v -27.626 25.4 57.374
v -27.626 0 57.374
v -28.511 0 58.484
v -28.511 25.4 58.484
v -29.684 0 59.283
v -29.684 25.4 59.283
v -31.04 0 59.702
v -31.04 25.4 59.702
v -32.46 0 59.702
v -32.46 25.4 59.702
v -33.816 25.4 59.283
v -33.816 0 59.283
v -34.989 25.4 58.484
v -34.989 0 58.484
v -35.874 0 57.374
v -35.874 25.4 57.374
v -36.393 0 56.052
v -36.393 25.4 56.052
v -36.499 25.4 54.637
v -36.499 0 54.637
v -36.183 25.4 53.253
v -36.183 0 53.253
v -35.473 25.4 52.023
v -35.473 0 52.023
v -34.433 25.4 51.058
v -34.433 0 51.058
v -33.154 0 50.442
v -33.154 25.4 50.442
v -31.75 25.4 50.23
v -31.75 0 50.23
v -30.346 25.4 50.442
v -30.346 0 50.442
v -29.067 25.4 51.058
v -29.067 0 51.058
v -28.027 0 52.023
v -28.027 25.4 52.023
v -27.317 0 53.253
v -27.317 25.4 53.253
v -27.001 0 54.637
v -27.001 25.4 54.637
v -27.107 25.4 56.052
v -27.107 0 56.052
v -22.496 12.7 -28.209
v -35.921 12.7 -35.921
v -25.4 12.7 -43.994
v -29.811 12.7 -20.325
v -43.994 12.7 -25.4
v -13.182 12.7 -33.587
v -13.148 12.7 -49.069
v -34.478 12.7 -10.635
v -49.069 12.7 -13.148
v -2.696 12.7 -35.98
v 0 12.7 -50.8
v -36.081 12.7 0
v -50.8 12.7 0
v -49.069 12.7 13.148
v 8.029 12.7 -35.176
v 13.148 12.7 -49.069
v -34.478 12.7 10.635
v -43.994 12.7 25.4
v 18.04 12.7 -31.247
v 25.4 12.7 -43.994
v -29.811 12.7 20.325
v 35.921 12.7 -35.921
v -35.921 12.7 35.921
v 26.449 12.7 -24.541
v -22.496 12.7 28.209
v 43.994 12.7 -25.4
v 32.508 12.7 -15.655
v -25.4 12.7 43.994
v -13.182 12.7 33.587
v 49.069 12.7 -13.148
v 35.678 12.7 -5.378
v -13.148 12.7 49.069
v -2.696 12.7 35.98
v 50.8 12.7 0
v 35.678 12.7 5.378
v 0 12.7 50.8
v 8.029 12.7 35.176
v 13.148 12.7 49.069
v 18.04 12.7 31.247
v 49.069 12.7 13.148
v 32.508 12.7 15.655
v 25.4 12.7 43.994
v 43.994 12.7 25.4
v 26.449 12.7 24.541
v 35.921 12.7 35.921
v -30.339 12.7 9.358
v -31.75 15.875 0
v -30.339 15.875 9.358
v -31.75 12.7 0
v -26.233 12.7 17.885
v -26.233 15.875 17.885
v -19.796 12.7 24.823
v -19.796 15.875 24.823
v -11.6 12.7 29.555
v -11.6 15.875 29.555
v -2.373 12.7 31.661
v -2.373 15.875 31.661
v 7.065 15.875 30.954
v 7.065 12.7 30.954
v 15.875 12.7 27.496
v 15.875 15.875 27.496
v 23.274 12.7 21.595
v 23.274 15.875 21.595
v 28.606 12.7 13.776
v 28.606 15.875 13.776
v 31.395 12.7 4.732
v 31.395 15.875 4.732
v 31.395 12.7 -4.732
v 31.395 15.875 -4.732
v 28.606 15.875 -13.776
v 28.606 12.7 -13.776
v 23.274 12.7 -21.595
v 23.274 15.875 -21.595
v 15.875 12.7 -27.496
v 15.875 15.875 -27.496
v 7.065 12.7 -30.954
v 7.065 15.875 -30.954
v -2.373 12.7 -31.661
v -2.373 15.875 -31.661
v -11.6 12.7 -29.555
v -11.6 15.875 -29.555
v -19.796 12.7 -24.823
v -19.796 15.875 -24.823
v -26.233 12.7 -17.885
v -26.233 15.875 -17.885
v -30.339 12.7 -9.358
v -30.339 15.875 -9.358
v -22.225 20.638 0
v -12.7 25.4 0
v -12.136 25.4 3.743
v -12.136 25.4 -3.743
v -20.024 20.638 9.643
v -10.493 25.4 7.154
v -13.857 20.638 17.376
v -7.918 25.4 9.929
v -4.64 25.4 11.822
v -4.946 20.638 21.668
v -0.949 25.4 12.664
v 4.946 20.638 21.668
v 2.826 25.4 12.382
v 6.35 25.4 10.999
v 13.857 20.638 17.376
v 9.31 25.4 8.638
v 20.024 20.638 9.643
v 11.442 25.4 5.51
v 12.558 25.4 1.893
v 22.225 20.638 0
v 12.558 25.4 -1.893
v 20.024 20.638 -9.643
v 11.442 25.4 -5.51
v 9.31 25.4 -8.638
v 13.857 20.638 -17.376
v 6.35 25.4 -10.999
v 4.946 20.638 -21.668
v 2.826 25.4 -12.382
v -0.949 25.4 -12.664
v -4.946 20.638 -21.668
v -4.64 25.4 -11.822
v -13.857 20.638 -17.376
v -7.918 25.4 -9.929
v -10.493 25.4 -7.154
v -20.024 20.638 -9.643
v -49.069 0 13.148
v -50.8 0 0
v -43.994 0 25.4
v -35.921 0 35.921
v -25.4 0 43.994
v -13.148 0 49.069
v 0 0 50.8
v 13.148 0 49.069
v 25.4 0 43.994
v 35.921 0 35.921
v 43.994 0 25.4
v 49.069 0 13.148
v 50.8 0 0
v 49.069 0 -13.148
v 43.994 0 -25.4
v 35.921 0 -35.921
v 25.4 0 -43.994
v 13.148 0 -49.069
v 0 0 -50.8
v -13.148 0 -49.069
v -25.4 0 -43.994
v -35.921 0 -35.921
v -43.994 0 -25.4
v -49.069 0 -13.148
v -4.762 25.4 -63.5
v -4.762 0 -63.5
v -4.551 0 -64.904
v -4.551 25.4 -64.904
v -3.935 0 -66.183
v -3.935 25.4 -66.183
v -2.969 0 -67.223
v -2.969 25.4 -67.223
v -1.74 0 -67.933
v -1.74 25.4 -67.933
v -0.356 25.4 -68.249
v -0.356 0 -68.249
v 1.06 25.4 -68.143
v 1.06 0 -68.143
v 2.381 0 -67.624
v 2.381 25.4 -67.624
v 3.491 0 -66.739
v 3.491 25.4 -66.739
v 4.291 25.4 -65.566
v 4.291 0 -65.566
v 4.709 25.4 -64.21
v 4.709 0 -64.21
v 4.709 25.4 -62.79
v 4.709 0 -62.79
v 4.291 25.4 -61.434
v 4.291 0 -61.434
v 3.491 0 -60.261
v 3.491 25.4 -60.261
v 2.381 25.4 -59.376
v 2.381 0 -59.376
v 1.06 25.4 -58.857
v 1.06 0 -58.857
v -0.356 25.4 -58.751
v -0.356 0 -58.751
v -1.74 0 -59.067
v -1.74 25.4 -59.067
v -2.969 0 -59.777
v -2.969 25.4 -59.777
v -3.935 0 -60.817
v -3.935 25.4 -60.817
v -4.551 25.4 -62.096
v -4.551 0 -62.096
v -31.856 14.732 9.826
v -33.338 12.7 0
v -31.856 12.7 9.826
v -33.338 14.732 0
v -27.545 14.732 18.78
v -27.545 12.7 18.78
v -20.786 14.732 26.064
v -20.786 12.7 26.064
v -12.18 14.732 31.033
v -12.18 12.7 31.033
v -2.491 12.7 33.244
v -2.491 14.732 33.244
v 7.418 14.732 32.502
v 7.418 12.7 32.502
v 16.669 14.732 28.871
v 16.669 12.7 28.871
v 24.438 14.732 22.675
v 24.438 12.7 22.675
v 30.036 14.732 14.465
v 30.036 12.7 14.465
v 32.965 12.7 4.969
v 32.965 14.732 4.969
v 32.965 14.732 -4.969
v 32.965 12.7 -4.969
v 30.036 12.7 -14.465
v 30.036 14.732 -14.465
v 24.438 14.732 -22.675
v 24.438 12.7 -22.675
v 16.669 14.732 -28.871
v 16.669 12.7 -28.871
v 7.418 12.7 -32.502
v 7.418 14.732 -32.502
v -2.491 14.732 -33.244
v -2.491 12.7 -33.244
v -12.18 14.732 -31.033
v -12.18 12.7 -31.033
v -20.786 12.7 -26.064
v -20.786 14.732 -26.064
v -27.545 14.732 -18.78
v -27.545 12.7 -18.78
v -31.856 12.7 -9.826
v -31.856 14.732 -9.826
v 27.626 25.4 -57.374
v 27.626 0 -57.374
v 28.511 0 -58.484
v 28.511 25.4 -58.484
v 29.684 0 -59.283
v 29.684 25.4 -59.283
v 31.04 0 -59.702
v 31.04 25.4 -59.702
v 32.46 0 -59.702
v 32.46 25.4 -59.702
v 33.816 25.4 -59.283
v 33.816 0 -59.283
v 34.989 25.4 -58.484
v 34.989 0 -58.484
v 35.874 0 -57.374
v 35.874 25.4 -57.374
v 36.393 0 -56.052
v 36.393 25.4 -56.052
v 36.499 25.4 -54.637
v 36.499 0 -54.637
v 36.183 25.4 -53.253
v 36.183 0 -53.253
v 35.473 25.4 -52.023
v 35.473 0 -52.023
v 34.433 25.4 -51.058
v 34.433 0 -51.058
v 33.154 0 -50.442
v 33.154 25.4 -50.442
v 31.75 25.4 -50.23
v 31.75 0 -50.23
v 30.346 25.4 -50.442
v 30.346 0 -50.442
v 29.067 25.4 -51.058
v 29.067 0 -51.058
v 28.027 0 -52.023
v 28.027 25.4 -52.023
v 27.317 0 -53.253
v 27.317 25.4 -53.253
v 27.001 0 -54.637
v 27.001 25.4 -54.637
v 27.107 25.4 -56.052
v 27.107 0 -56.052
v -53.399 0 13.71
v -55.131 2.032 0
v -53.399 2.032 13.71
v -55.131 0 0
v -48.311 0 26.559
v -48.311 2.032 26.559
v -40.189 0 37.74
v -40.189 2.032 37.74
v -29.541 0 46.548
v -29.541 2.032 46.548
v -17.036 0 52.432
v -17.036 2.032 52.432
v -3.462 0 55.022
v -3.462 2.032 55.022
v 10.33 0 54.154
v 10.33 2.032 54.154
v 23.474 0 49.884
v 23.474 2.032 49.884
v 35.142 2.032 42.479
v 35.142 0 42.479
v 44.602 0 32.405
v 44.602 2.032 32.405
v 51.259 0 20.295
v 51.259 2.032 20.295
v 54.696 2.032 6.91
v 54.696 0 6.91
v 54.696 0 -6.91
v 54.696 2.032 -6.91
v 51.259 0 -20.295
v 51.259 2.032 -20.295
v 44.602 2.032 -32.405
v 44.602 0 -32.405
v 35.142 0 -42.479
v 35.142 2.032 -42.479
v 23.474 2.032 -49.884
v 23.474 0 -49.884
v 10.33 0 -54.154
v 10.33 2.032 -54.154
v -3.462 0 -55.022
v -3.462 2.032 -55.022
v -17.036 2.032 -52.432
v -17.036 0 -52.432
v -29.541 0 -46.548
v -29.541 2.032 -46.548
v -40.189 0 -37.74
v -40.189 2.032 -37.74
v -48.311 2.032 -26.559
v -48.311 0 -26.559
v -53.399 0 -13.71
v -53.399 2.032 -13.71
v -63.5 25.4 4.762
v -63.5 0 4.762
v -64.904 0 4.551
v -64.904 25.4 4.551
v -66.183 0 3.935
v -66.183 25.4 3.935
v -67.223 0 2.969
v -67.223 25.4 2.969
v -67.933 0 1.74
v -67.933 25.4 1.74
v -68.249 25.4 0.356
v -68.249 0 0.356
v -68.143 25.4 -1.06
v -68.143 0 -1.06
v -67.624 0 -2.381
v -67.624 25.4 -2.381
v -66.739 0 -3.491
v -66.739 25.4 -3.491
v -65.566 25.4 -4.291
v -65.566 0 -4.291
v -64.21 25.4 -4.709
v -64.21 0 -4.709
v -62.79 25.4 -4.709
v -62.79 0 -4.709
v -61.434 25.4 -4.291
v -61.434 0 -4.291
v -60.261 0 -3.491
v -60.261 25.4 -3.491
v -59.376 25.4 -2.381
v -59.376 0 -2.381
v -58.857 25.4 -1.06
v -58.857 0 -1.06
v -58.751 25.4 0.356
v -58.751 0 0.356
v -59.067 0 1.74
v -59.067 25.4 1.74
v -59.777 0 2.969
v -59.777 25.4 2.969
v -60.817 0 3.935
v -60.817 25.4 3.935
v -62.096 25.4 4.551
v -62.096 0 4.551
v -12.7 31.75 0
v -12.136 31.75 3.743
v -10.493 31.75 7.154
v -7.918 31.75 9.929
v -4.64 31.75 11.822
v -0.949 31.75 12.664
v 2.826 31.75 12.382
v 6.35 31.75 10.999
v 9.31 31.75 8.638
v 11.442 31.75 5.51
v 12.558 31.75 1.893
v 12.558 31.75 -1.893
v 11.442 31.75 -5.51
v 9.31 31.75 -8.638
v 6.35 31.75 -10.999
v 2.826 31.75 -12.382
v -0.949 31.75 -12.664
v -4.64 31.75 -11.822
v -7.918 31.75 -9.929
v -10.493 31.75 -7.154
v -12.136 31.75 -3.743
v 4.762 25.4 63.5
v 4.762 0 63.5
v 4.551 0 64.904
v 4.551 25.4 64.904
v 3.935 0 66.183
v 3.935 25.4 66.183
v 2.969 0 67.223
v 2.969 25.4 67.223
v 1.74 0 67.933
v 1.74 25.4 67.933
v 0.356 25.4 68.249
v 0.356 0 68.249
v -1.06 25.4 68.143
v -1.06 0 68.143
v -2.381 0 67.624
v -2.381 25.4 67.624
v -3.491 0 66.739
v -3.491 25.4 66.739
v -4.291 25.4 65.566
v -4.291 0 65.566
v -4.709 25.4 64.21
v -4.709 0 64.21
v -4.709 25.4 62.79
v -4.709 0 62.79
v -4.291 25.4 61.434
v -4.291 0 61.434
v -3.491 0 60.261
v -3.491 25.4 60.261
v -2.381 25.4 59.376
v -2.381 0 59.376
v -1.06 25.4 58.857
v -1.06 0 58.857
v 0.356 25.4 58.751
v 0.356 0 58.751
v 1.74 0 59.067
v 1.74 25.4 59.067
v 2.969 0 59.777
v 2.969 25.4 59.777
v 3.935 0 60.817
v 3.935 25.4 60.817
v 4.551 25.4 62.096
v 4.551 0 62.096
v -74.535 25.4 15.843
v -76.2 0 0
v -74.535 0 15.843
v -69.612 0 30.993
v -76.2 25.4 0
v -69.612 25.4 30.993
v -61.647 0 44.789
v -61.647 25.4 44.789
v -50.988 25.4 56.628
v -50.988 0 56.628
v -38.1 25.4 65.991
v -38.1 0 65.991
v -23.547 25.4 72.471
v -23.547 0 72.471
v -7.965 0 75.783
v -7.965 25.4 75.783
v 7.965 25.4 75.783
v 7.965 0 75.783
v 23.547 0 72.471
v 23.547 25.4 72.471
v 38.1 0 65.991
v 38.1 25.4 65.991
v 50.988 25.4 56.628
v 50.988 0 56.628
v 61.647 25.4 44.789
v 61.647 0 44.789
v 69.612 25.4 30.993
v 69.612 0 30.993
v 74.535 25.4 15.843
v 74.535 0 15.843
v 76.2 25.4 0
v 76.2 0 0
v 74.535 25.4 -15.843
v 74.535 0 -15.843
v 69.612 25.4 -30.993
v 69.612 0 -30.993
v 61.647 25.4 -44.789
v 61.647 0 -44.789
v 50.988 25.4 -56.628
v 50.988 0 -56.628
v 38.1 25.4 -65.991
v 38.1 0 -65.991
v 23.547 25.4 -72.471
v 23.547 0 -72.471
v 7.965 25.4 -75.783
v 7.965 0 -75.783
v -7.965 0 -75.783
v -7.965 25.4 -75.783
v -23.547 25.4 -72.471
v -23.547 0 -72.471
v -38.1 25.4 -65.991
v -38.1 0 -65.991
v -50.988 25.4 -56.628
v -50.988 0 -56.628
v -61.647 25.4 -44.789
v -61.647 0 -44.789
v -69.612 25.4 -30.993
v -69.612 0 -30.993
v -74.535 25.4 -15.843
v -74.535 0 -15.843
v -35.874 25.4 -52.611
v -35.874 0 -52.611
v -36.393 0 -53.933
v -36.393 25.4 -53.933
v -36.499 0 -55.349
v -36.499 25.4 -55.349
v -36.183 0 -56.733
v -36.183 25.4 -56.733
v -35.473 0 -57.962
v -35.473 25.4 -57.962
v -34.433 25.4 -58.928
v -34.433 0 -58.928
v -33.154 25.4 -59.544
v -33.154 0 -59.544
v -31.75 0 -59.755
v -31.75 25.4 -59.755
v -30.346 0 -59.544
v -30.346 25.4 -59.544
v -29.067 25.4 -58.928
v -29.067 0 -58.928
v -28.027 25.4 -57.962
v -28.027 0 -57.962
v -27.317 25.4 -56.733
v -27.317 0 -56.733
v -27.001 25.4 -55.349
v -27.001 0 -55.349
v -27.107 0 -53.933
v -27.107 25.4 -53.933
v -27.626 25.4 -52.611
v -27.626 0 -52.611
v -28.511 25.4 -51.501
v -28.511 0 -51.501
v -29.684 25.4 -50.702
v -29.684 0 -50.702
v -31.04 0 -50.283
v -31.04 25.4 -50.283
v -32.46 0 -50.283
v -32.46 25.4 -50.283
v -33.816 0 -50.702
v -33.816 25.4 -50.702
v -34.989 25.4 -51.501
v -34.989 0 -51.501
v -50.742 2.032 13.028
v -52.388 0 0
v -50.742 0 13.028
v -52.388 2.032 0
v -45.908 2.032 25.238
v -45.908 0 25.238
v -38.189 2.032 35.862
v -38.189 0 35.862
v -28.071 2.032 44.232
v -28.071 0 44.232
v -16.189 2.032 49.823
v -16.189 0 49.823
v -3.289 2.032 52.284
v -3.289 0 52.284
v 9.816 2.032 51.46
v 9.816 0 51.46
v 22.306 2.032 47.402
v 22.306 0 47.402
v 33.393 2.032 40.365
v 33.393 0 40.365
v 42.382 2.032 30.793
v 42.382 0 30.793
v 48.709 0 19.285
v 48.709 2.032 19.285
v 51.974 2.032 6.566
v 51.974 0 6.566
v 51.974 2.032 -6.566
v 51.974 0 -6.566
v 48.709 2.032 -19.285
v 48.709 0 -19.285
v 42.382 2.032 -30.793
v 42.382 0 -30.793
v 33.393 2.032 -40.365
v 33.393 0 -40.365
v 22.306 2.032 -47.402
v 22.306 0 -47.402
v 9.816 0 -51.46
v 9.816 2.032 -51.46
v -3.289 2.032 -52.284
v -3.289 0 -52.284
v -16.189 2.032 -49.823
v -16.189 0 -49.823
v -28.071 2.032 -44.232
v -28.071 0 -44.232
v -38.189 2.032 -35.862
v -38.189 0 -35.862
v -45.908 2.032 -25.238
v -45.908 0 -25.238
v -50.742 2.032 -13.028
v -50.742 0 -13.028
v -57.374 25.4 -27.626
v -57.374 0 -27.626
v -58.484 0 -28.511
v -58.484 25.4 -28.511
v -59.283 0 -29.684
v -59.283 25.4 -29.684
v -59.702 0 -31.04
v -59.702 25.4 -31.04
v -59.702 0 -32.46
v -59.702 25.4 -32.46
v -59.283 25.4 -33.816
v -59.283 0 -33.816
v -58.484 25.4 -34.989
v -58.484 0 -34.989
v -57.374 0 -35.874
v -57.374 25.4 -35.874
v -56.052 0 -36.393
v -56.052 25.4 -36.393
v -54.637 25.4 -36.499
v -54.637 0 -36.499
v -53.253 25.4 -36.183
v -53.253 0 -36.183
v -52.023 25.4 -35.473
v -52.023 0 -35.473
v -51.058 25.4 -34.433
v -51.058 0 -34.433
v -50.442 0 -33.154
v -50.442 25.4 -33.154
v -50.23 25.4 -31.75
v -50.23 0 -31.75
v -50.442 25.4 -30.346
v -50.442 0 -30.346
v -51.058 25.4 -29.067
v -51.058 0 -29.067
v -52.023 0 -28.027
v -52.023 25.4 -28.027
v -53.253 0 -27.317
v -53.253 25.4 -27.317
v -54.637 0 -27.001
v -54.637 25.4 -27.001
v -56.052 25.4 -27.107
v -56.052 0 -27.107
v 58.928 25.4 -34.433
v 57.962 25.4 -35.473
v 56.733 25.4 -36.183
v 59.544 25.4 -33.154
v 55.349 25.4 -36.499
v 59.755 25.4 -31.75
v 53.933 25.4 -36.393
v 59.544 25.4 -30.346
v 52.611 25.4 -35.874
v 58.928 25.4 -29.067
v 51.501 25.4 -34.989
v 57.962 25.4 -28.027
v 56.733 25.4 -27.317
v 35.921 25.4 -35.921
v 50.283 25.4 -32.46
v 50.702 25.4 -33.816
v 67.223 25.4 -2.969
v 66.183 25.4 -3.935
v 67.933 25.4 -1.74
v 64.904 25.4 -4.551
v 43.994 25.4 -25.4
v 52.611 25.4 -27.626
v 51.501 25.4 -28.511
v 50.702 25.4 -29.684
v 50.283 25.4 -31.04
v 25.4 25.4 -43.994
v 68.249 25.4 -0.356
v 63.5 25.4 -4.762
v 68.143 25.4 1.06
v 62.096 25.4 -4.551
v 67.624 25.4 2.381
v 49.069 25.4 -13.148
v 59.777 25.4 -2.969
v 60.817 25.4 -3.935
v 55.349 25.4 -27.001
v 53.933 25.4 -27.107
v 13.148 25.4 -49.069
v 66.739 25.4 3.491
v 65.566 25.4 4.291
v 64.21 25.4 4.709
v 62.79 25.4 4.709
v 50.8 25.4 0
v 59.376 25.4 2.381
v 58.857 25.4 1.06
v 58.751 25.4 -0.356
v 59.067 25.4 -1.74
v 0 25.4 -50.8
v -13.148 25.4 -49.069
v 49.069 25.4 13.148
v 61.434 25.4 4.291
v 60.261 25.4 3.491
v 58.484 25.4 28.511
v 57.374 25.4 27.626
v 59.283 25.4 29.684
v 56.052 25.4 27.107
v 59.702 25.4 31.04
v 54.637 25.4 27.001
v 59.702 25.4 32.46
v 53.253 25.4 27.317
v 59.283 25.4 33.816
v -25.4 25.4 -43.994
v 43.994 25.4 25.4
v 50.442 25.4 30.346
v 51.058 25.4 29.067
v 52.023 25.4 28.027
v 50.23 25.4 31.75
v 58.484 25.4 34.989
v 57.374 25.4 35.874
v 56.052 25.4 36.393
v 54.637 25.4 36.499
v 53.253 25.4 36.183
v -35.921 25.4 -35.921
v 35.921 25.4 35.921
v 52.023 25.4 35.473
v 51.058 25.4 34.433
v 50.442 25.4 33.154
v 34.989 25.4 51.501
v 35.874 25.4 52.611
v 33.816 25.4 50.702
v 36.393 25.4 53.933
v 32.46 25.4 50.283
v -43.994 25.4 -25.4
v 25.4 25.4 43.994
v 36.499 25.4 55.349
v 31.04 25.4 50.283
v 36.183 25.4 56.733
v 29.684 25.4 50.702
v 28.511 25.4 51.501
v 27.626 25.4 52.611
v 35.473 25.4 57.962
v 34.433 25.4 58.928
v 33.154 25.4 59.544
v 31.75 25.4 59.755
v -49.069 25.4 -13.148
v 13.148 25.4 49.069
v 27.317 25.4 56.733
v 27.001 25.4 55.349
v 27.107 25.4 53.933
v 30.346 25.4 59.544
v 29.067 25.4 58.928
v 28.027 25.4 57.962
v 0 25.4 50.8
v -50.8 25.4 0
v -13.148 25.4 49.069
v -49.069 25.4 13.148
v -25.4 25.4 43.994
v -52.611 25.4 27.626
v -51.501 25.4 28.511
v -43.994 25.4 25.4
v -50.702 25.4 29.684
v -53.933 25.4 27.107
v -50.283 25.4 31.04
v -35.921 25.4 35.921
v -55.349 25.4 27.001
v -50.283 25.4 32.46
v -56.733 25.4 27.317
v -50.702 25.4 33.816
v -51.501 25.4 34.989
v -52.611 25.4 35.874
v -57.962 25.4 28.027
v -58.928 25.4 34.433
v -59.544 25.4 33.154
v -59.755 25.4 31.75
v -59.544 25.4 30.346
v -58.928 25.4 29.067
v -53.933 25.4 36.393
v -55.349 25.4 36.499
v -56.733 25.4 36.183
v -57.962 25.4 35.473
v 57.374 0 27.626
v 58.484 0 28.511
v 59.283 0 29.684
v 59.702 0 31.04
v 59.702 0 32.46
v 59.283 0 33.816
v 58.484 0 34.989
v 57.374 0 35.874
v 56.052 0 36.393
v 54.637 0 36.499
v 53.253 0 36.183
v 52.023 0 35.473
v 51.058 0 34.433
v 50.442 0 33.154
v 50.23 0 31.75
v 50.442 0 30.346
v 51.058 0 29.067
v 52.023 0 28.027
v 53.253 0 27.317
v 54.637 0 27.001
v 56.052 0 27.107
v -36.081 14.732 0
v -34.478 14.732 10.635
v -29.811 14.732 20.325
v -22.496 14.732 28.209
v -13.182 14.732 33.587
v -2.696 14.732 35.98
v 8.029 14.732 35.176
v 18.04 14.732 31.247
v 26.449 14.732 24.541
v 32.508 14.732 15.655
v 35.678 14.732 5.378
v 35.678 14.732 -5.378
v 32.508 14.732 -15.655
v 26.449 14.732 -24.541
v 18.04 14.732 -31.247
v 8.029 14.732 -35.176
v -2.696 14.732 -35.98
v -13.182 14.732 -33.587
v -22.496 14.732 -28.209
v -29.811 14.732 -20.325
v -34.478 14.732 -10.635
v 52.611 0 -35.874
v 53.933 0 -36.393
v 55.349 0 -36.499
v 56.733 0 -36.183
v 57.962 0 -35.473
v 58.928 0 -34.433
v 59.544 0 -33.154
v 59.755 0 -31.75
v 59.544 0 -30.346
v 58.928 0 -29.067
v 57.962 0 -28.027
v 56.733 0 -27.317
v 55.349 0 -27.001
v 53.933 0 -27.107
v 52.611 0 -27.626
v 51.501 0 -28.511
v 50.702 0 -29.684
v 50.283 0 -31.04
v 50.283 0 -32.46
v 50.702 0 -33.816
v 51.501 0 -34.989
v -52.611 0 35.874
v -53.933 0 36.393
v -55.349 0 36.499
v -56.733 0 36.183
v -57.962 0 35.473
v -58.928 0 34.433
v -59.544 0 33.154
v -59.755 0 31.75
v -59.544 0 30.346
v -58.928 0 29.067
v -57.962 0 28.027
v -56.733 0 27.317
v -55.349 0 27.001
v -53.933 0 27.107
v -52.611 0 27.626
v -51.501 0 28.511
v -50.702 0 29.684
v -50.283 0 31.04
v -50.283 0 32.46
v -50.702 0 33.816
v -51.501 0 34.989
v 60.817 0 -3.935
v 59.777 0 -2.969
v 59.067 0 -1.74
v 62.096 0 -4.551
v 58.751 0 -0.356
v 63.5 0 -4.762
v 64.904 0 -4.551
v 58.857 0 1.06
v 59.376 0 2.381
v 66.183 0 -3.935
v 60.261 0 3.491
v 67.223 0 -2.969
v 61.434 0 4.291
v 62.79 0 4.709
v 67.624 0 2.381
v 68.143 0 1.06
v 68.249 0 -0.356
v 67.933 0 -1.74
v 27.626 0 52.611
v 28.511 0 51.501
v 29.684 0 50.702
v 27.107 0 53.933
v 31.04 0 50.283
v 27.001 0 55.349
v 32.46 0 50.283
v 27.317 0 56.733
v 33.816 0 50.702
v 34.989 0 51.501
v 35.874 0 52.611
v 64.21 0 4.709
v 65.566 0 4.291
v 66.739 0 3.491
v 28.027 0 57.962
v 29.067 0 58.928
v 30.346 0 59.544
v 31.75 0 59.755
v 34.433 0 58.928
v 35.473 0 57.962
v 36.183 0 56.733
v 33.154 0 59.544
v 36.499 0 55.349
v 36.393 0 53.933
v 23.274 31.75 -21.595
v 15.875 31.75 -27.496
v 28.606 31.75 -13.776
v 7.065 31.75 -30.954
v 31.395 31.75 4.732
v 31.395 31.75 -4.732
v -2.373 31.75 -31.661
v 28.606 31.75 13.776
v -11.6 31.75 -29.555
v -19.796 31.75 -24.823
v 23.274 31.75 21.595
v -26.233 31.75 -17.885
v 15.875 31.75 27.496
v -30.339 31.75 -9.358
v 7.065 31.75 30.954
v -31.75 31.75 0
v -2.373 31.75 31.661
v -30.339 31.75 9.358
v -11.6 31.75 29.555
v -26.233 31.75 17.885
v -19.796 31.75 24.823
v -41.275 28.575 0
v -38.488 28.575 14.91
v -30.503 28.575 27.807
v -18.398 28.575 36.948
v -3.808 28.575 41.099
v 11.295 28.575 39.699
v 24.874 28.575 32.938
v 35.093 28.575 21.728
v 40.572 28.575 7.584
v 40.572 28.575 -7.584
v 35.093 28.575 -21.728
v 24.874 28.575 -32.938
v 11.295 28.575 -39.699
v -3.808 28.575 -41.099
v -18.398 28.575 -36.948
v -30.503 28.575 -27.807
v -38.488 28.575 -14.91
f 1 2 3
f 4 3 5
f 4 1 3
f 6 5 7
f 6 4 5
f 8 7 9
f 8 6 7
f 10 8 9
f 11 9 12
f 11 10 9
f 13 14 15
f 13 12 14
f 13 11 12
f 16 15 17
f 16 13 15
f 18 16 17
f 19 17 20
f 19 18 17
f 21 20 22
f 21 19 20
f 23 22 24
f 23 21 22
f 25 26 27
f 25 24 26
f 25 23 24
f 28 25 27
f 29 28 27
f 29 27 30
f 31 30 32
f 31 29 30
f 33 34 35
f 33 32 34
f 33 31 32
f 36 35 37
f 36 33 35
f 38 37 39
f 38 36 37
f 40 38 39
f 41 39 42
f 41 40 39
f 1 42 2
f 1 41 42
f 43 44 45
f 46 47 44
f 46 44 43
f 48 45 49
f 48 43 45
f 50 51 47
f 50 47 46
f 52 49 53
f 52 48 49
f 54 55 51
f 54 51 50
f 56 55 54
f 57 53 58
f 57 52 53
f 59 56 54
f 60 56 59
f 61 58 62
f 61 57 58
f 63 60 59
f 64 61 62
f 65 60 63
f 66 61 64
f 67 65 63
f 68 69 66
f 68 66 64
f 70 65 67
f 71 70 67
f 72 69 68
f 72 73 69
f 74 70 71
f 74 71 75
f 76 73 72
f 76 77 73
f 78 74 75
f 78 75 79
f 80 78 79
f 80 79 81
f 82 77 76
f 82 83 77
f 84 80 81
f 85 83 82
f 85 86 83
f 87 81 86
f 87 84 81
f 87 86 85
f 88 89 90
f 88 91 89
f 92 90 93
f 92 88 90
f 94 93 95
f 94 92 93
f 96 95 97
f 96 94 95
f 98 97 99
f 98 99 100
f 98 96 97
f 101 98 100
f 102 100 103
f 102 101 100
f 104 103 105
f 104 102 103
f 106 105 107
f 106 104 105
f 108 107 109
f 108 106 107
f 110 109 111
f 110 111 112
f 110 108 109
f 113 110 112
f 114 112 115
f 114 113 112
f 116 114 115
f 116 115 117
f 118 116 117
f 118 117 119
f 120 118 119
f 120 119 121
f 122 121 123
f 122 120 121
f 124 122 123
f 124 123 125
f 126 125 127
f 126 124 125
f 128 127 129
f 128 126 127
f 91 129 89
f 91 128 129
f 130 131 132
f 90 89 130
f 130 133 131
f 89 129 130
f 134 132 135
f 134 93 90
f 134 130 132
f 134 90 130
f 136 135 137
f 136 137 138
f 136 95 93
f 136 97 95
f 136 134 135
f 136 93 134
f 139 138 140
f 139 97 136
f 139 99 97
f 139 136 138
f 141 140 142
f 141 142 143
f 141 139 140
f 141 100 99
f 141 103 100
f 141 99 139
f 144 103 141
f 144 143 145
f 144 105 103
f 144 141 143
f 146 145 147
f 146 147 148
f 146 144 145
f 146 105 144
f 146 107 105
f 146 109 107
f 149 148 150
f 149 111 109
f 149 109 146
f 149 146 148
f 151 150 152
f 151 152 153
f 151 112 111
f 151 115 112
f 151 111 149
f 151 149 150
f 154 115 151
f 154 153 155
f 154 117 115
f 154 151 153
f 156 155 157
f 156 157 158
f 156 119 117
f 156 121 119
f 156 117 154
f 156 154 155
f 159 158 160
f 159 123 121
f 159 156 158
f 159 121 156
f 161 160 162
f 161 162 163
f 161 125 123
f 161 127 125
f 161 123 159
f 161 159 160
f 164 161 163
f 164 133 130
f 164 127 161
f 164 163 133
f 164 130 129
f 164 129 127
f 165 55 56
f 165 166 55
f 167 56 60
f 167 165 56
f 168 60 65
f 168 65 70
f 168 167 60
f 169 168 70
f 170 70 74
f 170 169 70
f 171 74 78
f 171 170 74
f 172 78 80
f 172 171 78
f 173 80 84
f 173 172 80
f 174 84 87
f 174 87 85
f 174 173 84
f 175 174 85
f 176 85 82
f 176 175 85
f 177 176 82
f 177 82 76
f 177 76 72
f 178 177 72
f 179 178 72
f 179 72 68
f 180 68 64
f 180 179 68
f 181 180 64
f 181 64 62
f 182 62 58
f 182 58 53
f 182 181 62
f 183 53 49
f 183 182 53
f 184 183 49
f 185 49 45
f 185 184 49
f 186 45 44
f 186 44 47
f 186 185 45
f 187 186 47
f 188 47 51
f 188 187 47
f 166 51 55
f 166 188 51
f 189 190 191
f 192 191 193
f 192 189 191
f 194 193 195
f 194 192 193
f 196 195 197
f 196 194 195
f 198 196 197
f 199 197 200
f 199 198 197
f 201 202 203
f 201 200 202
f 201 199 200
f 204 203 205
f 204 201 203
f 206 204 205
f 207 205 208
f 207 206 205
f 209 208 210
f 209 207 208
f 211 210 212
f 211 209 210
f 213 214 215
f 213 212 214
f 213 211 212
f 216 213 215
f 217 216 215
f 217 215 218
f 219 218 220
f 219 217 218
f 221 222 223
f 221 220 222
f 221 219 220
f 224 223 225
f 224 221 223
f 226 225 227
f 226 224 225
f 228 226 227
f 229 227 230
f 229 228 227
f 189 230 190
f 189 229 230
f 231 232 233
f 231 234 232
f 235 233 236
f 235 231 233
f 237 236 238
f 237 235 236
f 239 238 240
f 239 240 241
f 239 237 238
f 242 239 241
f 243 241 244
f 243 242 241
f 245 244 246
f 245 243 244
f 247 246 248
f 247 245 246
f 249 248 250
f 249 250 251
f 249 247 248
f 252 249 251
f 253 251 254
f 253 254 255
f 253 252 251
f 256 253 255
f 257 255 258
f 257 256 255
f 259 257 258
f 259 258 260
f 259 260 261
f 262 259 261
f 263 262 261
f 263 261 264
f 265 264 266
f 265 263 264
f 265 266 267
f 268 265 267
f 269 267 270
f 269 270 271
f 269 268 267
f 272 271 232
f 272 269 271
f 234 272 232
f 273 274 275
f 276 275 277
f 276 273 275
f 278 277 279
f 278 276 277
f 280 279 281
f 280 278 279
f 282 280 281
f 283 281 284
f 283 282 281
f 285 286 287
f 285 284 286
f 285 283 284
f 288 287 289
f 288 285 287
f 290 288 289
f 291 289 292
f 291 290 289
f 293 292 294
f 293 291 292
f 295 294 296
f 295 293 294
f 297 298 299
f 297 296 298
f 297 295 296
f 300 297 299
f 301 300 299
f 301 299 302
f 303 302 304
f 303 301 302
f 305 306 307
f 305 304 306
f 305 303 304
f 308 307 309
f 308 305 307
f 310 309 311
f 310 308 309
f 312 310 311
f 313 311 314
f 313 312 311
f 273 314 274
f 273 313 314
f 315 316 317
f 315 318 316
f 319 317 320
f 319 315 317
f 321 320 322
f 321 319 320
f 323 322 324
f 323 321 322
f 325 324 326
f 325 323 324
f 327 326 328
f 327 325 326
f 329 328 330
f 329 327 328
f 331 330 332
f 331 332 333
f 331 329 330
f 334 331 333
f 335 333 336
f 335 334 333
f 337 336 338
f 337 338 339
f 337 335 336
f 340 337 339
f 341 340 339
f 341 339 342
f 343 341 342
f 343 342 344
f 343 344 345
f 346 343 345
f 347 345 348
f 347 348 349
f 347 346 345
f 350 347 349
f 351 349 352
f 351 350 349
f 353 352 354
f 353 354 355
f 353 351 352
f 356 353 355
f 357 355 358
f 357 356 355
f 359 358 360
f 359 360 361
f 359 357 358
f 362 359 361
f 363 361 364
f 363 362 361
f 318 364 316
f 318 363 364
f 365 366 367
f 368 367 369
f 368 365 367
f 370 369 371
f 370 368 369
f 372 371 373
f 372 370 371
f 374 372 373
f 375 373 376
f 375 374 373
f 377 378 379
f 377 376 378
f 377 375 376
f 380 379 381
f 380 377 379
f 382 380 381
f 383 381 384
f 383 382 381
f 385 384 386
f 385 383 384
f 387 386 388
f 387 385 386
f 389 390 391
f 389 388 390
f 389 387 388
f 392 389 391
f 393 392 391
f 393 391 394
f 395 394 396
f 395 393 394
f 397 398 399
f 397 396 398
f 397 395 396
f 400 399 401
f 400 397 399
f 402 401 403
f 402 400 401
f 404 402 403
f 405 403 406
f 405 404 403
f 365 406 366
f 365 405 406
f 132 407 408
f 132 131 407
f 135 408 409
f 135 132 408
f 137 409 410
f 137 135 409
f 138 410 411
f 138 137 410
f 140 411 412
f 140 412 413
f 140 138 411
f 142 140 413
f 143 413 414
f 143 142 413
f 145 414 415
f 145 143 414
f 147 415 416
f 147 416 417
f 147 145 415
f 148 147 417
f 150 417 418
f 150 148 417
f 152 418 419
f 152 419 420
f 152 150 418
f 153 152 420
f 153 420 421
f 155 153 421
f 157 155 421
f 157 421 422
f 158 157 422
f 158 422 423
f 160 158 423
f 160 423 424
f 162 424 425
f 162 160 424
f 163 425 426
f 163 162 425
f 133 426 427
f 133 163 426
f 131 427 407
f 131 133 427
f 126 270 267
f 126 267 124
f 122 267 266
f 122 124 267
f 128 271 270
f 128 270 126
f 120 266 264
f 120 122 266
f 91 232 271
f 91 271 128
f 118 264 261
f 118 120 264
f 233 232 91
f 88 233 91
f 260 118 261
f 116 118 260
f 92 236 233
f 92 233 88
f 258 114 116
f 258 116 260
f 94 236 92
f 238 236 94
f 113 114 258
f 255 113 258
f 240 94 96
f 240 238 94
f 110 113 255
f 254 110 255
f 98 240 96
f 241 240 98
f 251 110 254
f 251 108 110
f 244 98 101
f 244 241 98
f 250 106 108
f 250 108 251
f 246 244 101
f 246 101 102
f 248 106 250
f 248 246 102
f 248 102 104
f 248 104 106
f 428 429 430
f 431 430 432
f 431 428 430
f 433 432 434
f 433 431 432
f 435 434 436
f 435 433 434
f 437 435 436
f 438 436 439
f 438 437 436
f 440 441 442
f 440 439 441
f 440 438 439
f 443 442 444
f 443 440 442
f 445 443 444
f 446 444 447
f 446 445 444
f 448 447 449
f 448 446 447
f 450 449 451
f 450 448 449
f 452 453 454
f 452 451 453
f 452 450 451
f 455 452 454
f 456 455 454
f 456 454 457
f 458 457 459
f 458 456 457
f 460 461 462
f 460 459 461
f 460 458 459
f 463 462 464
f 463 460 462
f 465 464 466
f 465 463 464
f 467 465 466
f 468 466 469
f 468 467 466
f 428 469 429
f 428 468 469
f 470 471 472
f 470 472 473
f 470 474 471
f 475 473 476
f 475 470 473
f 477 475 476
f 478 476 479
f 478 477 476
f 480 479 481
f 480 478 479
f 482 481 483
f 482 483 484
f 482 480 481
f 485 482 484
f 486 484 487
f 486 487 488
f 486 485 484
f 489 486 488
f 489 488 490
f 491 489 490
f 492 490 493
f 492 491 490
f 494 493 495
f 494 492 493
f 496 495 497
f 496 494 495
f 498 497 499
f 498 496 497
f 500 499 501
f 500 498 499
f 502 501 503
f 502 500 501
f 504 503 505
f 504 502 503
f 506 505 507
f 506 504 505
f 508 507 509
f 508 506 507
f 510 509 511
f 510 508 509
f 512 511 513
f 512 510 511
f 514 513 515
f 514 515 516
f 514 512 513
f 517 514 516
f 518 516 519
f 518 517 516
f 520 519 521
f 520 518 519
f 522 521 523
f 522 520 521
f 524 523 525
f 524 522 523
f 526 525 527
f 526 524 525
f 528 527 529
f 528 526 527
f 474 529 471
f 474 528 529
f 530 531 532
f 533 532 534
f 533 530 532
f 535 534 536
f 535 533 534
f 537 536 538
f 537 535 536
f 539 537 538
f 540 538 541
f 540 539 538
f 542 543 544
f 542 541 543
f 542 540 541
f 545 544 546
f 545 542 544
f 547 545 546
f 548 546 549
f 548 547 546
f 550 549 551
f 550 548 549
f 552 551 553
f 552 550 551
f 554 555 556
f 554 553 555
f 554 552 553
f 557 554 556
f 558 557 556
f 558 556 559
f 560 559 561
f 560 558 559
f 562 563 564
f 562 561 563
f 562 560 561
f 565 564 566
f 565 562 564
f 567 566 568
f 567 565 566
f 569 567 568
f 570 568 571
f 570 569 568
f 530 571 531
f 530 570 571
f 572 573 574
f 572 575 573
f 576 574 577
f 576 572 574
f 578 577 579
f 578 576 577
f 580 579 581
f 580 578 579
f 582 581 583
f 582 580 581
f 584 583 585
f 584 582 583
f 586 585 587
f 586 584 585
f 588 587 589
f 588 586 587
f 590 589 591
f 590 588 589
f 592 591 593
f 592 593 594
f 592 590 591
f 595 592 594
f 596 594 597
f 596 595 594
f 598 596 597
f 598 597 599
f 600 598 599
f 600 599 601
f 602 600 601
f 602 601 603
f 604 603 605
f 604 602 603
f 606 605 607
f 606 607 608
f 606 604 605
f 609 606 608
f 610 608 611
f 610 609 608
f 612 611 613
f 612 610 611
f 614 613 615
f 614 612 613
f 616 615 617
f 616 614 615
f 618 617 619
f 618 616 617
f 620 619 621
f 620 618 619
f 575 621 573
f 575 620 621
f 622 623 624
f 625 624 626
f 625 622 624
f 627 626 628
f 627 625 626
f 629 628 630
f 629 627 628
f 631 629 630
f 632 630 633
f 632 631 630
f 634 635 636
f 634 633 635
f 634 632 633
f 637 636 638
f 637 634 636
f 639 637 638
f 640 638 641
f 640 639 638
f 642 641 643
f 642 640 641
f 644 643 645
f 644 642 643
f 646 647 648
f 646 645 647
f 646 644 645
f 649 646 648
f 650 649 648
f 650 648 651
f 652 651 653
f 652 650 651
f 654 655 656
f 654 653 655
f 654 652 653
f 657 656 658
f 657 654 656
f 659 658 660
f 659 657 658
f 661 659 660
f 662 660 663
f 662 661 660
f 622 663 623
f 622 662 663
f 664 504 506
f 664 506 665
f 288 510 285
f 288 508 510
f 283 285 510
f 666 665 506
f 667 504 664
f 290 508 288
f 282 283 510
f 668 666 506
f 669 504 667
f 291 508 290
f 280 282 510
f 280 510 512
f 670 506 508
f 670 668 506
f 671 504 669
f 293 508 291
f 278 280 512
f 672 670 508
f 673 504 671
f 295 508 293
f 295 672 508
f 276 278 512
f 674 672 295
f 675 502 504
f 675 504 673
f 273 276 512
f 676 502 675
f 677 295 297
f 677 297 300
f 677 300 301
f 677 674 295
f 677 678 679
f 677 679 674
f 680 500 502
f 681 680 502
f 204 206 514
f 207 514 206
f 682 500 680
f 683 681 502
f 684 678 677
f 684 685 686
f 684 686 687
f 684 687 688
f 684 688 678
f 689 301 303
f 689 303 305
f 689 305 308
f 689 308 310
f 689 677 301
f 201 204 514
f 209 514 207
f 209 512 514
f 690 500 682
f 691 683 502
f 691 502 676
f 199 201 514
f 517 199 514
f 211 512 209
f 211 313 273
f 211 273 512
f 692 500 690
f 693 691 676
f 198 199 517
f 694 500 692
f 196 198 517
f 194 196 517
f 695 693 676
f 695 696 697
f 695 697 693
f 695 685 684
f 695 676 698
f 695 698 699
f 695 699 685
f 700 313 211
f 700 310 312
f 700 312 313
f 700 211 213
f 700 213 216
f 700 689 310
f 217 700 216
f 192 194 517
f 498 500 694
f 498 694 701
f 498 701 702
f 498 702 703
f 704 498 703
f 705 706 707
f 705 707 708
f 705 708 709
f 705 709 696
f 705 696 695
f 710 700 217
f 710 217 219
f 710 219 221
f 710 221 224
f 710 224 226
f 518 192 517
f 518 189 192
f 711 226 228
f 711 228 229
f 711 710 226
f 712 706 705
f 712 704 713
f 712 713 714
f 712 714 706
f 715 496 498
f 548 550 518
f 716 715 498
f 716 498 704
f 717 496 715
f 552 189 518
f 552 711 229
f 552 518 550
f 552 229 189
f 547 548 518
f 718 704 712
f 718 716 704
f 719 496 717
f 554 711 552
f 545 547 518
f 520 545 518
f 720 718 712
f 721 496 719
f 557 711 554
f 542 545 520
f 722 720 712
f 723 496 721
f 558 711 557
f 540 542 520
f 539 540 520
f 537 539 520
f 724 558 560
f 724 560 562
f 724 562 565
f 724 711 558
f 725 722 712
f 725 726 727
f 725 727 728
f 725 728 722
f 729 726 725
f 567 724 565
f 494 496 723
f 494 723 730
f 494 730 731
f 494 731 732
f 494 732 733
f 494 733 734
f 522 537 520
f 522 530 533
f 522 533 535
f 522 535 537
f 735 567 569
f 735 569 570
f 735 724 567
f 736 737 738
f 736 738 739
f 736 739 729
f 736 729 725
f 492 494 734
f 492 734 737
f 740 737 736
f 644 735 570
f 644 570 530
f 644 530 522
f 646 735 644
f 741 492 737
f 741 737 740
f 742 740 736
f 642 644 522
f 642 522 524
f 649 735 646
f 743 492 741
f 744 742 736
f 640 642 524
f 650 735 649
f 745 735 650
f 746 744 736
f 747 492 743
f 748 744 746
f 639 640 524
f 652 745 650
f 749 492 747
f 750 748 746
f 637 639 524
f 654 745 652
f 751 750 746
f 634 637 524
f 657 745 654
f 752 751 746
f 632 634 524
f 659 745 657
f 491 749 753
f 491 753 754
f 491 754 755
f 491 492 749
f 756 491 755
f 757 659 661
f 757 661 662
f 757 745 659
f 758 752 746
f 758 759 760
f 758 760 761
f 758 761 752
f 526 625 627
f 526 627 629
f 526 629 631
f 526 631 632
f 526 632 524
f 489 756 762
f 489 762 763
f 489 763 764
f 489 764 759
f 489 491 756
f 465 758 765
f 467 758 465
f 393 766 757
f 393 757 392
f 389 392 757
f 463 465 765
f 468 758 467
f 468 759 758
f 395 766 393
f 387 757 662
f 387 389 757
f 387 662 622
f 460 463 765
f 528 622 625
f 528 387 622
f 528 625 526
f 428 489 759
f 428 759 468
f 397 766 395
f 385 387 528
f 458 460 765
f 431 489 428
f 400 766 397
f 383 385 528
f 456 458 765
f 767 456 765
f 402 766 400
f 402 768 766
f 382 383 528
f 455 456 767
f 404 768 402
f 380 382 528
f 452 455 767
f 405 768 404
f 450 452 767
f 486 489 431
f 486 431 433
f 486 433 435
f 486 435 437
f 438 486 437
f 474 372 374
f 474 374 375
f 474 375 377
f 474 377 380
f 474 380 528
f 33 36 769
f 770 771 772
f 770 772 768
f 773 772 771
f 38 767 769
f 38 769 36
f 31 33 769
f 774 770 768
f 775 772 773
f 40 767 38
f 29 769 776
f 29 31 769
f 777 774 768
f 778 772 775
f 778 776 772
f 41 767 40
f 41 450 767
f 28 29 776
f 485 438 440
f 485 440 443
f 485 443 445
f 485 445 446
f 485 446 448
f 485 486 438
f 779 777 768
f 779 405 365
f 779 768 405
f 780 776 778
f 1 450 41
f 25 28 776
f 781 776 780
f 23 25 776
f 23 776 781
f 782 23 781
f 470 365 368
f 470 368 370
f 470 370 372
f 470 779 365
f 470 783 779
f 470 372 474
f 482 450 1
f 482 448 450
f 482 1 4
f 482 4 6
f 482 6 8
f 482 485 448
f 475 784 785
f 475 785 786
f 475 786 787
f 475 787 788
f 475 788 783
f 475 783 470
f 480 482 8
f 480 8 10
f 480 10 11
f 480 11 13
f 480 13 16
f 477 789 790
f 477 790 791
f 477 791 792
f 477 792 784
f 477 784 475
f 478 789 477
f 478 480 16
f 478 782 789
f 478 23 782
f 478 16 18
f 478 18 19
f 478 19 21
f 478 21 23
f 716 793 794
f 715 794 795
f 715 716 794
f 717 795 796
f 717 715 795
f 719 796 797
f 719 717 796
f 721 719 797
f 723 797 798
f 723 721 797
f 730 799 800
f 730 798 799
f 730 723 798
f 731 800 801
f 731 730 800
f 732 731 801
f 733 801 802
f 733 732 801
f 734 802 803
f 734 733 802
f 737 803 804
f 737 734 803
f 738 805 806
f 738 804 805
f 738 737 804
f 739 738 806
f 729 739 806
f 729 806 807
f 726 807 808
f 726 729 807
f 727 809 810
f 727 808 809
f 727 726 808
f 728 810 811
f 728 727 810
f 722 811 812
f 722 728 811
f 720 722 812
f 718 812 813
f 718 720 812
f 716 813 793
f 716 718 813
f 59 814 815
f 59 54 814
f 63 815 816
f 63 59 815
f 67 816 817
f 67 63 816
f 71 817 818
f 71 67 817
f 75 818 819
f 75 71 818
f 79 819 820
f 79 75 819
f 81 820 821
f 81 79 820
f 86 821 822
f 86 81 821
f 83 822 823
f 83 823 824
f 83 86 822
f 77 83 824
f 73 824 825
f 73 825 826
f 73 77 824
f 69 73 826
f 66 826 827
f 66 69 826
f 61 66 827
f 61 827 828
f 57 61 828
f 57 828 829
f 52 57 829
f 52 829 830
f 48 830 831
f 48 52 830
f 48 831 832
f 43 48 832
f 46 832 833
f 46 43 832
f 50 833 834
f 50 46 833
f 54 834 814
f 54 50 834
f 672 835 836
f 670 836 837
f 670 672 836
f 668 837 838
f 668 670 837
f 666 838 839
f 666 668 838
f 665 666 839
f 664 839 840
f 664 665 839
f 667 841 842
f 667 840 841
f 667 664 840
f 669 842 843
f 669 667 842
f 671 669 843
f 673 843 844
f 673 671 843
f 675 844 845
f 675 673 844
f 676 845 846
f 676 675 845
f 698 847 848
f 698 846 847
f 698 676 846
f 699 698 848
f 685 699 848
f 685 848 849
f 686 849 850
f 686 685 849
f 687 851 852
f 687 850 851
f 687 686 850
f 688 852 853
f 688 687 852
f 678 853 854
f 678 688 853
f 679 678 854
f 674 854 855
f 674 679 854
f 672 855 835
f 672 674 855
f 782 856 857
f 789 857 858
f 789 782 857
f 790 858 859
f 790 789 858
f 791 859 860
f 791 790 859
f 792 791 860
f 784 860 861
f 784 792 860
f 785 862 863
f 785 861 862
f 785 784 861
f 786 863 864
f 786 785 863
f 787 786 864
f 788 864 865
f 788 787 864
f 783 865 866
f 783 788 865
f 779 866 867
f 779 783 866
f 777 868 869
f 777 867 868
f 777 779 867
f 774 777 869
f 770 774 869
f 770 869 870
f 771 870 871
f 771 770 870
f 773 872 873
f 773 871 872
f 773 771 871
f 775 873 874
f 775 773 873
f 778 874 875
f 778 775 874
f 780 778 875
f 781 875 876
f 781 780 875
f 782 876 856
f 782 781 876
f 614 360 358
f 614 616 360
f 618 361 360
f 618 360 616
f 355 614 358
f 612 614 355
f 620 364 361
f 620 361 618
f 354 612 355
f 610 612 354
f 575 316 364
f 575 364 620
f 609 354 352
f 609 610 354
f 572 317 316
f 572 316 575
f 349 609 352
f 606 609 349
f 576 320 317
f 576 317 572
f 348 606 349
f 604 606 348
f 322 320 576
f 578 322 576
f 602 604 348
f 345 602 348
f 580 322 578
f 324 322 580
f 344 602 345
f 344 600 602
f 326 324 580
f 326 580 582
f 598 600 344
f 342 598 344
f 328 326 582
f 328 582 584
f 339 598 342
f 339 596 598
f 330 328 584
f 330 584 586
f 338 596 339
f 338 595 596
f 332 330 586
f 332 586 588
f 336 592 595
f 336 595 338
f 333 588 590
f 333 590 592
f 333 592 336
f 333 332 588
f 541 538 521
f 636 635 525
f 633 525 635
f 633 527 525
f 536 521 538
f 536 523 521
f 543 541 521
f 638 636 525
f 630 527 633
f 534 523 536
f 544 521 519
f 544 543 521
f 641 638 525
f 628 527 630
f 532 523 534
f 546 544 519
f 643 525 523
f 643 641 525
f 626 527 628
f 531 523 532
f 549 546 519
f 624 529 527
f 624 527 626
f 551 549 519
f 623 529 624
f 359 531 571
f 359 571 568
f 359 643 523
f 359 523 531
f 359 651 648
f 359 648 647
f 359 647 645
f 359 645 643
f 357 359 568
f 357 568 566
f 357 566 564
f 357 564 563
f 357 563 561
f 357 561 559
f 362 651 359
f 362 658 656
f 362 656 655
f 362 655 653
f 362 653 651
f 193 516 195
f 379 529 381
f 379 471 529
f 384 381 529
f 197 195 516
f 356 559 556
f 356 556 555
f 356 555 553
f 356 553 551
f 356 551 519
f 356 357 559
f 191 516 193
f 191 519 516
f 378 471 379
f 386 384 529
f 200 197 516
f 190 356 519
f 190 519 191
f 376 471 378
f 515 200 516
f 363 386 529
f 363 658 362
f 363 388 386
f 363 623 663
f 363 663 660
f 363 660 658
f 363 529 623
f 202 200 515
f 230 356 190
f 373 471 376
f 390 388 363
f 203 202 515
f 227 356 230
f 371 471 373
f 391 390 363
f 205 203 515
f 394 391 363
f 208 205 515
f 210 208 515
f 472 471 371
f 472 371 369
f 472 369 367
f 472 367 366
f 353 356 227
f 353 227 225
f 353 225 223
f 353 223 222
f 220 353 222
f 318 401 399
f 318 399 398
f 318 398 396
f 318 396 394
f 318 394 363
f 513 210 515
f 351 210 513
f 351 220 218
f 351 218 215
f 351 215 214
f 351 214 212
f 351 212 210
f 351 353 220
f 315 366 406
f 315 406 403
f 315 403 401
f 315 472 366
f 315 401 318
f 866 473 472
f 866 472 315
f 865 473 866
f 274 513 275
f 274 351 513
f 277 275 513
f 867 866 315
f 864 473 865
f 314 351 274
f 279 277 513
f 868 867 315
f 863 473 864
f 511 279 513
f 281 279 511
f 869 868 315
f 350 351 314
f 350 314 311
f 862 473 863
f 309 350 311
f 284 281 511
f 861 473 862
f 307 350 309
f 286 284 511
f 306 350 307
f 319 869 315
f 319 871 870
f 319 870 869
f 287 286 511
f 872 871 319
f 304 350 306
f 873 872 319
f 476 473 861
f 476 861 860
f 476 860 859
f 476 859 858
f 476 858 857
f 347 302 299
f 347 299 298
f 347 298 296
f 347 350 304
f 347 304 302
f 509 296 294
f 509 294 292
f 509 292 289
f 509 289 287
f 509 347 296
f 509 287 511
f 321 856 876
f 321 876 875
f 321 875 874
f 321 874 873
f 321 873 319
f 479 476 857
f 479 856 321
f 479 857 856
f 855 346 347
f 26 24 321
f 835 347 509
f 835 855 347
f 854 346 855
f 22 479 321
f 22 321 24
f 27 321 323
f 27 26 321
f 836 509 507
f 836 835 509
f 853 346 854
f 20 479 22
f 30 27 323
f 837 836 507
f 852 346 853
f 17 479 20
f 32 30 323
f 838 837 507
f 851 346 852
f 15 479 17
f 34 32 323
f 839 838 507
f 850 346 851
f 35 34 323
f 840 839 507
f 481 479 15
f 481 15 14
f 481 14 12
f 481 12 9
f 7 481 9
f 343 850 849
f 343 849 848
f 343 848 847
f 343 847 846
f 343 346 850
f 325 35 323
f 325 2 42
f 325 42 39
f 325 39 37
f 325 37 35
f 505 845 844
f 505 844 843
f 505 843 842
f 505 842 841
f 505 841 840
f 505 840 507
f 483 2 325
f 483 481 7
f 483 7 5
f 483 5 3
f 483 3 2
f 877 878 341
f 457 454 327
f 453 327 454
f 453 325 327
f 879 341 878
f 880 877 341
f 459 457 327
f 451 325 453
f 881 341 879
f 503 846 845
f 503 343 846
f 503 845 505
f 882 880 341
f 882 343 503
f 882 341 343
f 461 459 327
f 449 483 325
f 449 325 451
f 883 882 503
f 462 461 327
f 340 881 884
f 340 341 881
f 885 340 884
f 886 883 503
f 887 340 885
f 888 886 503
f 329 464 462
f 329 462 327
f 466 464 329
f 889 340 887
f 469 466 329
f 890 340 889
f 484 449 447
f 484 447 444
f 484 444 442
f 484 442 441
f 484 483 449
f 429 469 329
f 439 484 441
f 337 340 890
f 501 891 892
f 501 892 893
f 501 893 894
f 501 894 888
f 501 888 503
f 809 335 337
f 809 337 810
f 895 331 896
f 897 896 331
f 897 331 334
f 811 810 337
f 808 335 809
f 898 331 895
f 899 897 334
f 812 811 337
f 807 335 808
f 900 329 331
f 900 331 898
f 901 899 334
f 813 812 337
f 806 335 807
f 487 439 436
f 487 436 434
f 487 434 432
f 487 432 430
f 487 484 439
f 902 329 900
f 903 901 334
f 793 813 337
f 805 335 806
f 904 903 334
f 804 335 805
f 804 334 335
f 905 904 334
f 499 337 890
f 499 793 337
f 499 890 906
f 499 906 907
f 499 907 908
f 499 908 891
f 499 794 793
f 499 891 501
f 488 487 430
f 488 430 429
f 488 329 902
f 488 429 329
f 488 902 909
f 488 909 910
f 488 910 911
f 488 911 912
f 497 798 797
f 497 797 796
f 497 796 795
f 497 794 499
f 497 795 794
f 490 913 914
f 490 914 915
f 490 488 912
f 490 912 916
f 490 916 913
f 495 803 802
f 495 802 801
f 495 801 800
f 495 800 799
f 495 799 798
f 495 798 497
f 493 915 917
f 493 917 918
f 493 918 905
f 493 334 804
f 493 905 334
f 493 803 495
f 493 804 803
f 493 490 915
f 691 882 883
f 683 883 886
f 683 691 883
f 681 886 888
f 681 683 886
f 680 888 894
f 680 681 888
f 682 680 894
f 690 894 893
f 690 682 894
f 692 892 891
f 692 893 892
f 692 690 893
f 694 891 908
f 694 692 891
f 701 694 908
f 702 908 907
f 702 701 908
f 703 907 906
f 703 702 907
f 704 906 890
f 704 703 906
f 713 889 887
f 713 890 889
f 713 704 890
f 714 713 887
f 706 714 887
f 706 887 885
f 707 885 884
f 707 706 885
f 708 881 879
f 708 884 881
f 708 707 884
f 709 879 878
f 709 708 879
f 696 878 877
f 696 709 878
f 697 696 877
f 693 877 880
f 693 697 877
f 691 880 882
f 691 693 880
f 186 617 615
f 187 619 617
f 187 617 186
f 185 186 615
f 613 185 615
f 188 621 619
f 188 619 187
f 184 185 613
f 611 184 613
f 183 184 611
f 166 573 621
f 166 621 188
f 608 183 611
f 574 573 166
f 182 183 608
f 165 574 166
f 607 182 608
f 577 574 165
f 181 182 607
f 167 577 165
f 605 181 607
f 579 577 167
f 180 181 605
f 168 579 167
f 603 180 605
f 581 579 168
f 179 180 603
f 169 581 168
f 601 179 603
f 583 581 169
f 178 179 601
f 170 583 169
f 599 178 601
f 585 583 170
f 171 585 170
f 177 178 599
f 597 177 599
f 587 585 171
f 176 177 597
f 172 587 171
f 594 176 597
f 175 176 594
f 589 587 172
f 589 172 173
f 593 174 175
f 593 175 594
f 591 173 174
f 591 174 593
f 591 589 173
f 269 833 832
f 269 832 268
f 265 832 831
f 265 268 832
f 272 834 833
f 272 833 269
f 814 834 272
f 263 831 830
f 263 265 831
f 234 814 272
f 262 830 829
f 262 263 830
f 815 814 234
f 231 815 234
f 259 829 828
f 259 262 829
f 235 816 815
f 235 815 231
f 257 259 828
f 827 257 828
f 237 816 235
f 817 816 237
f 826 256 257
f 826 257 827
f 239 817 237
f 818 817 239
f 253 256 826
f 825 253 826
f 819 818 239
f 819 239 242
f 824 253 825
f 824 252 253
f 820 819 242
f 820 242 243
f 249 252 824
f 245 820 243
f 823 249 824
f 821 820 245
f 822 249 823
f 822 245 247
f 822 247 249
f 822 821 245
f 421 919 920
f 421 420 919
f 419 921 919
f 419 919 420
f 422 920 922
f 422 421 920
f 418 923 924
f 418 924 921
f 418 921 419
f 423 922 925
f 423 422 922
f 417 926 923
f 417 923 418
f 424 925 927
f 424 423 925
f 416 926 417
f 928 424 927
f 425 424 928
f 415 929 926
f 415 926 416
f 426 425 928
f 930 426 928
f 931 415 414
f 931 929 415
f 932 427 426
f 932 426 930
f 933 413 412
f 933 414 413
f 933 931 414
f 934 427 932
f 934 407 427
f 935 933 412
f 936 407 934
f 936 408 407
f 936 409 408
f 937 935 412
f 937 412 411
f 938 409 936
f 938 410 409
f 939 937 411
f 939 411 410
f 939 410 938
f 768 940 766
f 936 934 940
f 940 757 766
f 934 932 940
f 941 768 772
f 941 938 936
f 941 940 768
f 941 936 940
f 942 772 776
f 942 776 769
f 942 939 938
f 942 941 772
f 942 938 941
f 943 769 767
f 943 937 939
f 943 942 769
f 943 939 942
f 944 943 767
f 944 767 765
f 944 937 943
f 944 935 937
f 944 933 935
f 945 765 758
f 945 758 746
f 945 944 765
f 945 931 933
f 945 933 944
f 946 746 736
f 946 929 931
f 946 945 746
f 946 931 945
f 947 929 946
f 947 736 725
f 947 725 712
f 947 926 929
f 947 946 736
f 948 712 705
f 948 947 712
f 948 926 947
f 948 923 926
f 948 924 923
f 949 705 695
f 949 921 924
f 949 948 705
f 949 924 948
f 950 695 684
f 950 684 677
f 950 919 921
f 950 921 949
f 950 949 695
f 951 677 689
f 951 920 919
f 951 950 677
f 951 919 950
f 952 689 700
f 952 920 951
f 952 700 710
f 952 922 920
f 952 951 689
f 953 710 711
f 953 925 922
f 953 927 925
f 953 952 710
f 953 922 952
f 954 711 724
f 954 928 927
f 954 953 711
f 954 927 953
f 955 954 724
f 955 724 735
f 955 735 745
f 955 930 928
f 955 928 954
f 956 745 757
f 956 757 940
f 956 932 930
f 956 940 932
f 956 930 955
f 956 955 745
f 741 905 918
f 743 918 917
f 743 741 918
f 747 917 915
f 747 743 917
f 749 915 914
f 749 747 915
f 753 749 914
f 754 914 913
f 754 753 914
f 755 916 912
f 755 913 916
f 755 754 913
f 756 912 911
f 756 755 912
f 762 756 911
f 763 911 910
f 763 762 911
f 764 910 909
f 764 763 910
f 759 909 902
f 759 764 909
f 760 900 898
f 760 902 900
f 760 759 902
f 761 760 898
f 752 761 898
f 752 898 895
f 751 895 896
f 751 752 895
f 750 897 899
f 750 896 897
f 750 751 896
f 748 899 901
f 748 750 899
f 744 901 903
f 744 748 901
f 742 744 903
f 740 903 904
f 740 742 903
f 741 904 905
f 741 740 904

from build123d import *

# Parameters (mm, degrees)
CIRPATTERN1_COUNT = 12


with BuildPart() as part:
    # Sketch1 → Revolve1 (revolve)
    with BuildSketch(Plane.XY):
        Polygon((-76.2, 0), (-76.2, 25.4), (-50.8, 25.4), (-31.75, 31.75), (-12.7, 31.75), (-12.7, 25.4), (-31.75, 15.875), (-31.75, 12.7), (-33.3375, 12.7), (-33.3375, 14.732), (-36.0807, 14.732), (-36.0807, 12.7), (-50.8, 12.7), (-50.8, 0), (-52.3875, 0), (-52.3875, 2.032), (-55.1307, 2.032), (-55.1307, 0), align=None)
    revolve(axis=Axis((0, -1.5875, 0), (0, 1, 0)))

    # Sketch3 → 3/8 (0.375) Diameter Hole1 (revolve, cut)
    with BuildSketch(Plane(origin=(-63.5, 25.4, 0), x_dir=(0, 0, 1), z_dir=(1, 0, 0))):
        Polygon((0, 0), (0, 53.661598698), (4.7625, 50.8), (4.7625, 0), align=None)
    f_3_8_0_375_diameter_hole1 = revolve(axis=Axis((-63.5, 31.75, 0), (0, -1, 0)), mode=Mode.SUBTRACT)

    # CirPattern1: 3/8 (0.375) Diameter Hole1 ×12 about axis
    cirpattern1_axis = Axis((0, 0, 0), (0, 1, 0))
    for i in range(1, CIRPATTERN1_COUNT):
        add(f_3_8_0_375_diameter_hole1.rotate(cirpattern1_axis, i * 360 / CIRPATTERN1_COUNT), mode=Mode.SUBTRACT)


solid = part.part
